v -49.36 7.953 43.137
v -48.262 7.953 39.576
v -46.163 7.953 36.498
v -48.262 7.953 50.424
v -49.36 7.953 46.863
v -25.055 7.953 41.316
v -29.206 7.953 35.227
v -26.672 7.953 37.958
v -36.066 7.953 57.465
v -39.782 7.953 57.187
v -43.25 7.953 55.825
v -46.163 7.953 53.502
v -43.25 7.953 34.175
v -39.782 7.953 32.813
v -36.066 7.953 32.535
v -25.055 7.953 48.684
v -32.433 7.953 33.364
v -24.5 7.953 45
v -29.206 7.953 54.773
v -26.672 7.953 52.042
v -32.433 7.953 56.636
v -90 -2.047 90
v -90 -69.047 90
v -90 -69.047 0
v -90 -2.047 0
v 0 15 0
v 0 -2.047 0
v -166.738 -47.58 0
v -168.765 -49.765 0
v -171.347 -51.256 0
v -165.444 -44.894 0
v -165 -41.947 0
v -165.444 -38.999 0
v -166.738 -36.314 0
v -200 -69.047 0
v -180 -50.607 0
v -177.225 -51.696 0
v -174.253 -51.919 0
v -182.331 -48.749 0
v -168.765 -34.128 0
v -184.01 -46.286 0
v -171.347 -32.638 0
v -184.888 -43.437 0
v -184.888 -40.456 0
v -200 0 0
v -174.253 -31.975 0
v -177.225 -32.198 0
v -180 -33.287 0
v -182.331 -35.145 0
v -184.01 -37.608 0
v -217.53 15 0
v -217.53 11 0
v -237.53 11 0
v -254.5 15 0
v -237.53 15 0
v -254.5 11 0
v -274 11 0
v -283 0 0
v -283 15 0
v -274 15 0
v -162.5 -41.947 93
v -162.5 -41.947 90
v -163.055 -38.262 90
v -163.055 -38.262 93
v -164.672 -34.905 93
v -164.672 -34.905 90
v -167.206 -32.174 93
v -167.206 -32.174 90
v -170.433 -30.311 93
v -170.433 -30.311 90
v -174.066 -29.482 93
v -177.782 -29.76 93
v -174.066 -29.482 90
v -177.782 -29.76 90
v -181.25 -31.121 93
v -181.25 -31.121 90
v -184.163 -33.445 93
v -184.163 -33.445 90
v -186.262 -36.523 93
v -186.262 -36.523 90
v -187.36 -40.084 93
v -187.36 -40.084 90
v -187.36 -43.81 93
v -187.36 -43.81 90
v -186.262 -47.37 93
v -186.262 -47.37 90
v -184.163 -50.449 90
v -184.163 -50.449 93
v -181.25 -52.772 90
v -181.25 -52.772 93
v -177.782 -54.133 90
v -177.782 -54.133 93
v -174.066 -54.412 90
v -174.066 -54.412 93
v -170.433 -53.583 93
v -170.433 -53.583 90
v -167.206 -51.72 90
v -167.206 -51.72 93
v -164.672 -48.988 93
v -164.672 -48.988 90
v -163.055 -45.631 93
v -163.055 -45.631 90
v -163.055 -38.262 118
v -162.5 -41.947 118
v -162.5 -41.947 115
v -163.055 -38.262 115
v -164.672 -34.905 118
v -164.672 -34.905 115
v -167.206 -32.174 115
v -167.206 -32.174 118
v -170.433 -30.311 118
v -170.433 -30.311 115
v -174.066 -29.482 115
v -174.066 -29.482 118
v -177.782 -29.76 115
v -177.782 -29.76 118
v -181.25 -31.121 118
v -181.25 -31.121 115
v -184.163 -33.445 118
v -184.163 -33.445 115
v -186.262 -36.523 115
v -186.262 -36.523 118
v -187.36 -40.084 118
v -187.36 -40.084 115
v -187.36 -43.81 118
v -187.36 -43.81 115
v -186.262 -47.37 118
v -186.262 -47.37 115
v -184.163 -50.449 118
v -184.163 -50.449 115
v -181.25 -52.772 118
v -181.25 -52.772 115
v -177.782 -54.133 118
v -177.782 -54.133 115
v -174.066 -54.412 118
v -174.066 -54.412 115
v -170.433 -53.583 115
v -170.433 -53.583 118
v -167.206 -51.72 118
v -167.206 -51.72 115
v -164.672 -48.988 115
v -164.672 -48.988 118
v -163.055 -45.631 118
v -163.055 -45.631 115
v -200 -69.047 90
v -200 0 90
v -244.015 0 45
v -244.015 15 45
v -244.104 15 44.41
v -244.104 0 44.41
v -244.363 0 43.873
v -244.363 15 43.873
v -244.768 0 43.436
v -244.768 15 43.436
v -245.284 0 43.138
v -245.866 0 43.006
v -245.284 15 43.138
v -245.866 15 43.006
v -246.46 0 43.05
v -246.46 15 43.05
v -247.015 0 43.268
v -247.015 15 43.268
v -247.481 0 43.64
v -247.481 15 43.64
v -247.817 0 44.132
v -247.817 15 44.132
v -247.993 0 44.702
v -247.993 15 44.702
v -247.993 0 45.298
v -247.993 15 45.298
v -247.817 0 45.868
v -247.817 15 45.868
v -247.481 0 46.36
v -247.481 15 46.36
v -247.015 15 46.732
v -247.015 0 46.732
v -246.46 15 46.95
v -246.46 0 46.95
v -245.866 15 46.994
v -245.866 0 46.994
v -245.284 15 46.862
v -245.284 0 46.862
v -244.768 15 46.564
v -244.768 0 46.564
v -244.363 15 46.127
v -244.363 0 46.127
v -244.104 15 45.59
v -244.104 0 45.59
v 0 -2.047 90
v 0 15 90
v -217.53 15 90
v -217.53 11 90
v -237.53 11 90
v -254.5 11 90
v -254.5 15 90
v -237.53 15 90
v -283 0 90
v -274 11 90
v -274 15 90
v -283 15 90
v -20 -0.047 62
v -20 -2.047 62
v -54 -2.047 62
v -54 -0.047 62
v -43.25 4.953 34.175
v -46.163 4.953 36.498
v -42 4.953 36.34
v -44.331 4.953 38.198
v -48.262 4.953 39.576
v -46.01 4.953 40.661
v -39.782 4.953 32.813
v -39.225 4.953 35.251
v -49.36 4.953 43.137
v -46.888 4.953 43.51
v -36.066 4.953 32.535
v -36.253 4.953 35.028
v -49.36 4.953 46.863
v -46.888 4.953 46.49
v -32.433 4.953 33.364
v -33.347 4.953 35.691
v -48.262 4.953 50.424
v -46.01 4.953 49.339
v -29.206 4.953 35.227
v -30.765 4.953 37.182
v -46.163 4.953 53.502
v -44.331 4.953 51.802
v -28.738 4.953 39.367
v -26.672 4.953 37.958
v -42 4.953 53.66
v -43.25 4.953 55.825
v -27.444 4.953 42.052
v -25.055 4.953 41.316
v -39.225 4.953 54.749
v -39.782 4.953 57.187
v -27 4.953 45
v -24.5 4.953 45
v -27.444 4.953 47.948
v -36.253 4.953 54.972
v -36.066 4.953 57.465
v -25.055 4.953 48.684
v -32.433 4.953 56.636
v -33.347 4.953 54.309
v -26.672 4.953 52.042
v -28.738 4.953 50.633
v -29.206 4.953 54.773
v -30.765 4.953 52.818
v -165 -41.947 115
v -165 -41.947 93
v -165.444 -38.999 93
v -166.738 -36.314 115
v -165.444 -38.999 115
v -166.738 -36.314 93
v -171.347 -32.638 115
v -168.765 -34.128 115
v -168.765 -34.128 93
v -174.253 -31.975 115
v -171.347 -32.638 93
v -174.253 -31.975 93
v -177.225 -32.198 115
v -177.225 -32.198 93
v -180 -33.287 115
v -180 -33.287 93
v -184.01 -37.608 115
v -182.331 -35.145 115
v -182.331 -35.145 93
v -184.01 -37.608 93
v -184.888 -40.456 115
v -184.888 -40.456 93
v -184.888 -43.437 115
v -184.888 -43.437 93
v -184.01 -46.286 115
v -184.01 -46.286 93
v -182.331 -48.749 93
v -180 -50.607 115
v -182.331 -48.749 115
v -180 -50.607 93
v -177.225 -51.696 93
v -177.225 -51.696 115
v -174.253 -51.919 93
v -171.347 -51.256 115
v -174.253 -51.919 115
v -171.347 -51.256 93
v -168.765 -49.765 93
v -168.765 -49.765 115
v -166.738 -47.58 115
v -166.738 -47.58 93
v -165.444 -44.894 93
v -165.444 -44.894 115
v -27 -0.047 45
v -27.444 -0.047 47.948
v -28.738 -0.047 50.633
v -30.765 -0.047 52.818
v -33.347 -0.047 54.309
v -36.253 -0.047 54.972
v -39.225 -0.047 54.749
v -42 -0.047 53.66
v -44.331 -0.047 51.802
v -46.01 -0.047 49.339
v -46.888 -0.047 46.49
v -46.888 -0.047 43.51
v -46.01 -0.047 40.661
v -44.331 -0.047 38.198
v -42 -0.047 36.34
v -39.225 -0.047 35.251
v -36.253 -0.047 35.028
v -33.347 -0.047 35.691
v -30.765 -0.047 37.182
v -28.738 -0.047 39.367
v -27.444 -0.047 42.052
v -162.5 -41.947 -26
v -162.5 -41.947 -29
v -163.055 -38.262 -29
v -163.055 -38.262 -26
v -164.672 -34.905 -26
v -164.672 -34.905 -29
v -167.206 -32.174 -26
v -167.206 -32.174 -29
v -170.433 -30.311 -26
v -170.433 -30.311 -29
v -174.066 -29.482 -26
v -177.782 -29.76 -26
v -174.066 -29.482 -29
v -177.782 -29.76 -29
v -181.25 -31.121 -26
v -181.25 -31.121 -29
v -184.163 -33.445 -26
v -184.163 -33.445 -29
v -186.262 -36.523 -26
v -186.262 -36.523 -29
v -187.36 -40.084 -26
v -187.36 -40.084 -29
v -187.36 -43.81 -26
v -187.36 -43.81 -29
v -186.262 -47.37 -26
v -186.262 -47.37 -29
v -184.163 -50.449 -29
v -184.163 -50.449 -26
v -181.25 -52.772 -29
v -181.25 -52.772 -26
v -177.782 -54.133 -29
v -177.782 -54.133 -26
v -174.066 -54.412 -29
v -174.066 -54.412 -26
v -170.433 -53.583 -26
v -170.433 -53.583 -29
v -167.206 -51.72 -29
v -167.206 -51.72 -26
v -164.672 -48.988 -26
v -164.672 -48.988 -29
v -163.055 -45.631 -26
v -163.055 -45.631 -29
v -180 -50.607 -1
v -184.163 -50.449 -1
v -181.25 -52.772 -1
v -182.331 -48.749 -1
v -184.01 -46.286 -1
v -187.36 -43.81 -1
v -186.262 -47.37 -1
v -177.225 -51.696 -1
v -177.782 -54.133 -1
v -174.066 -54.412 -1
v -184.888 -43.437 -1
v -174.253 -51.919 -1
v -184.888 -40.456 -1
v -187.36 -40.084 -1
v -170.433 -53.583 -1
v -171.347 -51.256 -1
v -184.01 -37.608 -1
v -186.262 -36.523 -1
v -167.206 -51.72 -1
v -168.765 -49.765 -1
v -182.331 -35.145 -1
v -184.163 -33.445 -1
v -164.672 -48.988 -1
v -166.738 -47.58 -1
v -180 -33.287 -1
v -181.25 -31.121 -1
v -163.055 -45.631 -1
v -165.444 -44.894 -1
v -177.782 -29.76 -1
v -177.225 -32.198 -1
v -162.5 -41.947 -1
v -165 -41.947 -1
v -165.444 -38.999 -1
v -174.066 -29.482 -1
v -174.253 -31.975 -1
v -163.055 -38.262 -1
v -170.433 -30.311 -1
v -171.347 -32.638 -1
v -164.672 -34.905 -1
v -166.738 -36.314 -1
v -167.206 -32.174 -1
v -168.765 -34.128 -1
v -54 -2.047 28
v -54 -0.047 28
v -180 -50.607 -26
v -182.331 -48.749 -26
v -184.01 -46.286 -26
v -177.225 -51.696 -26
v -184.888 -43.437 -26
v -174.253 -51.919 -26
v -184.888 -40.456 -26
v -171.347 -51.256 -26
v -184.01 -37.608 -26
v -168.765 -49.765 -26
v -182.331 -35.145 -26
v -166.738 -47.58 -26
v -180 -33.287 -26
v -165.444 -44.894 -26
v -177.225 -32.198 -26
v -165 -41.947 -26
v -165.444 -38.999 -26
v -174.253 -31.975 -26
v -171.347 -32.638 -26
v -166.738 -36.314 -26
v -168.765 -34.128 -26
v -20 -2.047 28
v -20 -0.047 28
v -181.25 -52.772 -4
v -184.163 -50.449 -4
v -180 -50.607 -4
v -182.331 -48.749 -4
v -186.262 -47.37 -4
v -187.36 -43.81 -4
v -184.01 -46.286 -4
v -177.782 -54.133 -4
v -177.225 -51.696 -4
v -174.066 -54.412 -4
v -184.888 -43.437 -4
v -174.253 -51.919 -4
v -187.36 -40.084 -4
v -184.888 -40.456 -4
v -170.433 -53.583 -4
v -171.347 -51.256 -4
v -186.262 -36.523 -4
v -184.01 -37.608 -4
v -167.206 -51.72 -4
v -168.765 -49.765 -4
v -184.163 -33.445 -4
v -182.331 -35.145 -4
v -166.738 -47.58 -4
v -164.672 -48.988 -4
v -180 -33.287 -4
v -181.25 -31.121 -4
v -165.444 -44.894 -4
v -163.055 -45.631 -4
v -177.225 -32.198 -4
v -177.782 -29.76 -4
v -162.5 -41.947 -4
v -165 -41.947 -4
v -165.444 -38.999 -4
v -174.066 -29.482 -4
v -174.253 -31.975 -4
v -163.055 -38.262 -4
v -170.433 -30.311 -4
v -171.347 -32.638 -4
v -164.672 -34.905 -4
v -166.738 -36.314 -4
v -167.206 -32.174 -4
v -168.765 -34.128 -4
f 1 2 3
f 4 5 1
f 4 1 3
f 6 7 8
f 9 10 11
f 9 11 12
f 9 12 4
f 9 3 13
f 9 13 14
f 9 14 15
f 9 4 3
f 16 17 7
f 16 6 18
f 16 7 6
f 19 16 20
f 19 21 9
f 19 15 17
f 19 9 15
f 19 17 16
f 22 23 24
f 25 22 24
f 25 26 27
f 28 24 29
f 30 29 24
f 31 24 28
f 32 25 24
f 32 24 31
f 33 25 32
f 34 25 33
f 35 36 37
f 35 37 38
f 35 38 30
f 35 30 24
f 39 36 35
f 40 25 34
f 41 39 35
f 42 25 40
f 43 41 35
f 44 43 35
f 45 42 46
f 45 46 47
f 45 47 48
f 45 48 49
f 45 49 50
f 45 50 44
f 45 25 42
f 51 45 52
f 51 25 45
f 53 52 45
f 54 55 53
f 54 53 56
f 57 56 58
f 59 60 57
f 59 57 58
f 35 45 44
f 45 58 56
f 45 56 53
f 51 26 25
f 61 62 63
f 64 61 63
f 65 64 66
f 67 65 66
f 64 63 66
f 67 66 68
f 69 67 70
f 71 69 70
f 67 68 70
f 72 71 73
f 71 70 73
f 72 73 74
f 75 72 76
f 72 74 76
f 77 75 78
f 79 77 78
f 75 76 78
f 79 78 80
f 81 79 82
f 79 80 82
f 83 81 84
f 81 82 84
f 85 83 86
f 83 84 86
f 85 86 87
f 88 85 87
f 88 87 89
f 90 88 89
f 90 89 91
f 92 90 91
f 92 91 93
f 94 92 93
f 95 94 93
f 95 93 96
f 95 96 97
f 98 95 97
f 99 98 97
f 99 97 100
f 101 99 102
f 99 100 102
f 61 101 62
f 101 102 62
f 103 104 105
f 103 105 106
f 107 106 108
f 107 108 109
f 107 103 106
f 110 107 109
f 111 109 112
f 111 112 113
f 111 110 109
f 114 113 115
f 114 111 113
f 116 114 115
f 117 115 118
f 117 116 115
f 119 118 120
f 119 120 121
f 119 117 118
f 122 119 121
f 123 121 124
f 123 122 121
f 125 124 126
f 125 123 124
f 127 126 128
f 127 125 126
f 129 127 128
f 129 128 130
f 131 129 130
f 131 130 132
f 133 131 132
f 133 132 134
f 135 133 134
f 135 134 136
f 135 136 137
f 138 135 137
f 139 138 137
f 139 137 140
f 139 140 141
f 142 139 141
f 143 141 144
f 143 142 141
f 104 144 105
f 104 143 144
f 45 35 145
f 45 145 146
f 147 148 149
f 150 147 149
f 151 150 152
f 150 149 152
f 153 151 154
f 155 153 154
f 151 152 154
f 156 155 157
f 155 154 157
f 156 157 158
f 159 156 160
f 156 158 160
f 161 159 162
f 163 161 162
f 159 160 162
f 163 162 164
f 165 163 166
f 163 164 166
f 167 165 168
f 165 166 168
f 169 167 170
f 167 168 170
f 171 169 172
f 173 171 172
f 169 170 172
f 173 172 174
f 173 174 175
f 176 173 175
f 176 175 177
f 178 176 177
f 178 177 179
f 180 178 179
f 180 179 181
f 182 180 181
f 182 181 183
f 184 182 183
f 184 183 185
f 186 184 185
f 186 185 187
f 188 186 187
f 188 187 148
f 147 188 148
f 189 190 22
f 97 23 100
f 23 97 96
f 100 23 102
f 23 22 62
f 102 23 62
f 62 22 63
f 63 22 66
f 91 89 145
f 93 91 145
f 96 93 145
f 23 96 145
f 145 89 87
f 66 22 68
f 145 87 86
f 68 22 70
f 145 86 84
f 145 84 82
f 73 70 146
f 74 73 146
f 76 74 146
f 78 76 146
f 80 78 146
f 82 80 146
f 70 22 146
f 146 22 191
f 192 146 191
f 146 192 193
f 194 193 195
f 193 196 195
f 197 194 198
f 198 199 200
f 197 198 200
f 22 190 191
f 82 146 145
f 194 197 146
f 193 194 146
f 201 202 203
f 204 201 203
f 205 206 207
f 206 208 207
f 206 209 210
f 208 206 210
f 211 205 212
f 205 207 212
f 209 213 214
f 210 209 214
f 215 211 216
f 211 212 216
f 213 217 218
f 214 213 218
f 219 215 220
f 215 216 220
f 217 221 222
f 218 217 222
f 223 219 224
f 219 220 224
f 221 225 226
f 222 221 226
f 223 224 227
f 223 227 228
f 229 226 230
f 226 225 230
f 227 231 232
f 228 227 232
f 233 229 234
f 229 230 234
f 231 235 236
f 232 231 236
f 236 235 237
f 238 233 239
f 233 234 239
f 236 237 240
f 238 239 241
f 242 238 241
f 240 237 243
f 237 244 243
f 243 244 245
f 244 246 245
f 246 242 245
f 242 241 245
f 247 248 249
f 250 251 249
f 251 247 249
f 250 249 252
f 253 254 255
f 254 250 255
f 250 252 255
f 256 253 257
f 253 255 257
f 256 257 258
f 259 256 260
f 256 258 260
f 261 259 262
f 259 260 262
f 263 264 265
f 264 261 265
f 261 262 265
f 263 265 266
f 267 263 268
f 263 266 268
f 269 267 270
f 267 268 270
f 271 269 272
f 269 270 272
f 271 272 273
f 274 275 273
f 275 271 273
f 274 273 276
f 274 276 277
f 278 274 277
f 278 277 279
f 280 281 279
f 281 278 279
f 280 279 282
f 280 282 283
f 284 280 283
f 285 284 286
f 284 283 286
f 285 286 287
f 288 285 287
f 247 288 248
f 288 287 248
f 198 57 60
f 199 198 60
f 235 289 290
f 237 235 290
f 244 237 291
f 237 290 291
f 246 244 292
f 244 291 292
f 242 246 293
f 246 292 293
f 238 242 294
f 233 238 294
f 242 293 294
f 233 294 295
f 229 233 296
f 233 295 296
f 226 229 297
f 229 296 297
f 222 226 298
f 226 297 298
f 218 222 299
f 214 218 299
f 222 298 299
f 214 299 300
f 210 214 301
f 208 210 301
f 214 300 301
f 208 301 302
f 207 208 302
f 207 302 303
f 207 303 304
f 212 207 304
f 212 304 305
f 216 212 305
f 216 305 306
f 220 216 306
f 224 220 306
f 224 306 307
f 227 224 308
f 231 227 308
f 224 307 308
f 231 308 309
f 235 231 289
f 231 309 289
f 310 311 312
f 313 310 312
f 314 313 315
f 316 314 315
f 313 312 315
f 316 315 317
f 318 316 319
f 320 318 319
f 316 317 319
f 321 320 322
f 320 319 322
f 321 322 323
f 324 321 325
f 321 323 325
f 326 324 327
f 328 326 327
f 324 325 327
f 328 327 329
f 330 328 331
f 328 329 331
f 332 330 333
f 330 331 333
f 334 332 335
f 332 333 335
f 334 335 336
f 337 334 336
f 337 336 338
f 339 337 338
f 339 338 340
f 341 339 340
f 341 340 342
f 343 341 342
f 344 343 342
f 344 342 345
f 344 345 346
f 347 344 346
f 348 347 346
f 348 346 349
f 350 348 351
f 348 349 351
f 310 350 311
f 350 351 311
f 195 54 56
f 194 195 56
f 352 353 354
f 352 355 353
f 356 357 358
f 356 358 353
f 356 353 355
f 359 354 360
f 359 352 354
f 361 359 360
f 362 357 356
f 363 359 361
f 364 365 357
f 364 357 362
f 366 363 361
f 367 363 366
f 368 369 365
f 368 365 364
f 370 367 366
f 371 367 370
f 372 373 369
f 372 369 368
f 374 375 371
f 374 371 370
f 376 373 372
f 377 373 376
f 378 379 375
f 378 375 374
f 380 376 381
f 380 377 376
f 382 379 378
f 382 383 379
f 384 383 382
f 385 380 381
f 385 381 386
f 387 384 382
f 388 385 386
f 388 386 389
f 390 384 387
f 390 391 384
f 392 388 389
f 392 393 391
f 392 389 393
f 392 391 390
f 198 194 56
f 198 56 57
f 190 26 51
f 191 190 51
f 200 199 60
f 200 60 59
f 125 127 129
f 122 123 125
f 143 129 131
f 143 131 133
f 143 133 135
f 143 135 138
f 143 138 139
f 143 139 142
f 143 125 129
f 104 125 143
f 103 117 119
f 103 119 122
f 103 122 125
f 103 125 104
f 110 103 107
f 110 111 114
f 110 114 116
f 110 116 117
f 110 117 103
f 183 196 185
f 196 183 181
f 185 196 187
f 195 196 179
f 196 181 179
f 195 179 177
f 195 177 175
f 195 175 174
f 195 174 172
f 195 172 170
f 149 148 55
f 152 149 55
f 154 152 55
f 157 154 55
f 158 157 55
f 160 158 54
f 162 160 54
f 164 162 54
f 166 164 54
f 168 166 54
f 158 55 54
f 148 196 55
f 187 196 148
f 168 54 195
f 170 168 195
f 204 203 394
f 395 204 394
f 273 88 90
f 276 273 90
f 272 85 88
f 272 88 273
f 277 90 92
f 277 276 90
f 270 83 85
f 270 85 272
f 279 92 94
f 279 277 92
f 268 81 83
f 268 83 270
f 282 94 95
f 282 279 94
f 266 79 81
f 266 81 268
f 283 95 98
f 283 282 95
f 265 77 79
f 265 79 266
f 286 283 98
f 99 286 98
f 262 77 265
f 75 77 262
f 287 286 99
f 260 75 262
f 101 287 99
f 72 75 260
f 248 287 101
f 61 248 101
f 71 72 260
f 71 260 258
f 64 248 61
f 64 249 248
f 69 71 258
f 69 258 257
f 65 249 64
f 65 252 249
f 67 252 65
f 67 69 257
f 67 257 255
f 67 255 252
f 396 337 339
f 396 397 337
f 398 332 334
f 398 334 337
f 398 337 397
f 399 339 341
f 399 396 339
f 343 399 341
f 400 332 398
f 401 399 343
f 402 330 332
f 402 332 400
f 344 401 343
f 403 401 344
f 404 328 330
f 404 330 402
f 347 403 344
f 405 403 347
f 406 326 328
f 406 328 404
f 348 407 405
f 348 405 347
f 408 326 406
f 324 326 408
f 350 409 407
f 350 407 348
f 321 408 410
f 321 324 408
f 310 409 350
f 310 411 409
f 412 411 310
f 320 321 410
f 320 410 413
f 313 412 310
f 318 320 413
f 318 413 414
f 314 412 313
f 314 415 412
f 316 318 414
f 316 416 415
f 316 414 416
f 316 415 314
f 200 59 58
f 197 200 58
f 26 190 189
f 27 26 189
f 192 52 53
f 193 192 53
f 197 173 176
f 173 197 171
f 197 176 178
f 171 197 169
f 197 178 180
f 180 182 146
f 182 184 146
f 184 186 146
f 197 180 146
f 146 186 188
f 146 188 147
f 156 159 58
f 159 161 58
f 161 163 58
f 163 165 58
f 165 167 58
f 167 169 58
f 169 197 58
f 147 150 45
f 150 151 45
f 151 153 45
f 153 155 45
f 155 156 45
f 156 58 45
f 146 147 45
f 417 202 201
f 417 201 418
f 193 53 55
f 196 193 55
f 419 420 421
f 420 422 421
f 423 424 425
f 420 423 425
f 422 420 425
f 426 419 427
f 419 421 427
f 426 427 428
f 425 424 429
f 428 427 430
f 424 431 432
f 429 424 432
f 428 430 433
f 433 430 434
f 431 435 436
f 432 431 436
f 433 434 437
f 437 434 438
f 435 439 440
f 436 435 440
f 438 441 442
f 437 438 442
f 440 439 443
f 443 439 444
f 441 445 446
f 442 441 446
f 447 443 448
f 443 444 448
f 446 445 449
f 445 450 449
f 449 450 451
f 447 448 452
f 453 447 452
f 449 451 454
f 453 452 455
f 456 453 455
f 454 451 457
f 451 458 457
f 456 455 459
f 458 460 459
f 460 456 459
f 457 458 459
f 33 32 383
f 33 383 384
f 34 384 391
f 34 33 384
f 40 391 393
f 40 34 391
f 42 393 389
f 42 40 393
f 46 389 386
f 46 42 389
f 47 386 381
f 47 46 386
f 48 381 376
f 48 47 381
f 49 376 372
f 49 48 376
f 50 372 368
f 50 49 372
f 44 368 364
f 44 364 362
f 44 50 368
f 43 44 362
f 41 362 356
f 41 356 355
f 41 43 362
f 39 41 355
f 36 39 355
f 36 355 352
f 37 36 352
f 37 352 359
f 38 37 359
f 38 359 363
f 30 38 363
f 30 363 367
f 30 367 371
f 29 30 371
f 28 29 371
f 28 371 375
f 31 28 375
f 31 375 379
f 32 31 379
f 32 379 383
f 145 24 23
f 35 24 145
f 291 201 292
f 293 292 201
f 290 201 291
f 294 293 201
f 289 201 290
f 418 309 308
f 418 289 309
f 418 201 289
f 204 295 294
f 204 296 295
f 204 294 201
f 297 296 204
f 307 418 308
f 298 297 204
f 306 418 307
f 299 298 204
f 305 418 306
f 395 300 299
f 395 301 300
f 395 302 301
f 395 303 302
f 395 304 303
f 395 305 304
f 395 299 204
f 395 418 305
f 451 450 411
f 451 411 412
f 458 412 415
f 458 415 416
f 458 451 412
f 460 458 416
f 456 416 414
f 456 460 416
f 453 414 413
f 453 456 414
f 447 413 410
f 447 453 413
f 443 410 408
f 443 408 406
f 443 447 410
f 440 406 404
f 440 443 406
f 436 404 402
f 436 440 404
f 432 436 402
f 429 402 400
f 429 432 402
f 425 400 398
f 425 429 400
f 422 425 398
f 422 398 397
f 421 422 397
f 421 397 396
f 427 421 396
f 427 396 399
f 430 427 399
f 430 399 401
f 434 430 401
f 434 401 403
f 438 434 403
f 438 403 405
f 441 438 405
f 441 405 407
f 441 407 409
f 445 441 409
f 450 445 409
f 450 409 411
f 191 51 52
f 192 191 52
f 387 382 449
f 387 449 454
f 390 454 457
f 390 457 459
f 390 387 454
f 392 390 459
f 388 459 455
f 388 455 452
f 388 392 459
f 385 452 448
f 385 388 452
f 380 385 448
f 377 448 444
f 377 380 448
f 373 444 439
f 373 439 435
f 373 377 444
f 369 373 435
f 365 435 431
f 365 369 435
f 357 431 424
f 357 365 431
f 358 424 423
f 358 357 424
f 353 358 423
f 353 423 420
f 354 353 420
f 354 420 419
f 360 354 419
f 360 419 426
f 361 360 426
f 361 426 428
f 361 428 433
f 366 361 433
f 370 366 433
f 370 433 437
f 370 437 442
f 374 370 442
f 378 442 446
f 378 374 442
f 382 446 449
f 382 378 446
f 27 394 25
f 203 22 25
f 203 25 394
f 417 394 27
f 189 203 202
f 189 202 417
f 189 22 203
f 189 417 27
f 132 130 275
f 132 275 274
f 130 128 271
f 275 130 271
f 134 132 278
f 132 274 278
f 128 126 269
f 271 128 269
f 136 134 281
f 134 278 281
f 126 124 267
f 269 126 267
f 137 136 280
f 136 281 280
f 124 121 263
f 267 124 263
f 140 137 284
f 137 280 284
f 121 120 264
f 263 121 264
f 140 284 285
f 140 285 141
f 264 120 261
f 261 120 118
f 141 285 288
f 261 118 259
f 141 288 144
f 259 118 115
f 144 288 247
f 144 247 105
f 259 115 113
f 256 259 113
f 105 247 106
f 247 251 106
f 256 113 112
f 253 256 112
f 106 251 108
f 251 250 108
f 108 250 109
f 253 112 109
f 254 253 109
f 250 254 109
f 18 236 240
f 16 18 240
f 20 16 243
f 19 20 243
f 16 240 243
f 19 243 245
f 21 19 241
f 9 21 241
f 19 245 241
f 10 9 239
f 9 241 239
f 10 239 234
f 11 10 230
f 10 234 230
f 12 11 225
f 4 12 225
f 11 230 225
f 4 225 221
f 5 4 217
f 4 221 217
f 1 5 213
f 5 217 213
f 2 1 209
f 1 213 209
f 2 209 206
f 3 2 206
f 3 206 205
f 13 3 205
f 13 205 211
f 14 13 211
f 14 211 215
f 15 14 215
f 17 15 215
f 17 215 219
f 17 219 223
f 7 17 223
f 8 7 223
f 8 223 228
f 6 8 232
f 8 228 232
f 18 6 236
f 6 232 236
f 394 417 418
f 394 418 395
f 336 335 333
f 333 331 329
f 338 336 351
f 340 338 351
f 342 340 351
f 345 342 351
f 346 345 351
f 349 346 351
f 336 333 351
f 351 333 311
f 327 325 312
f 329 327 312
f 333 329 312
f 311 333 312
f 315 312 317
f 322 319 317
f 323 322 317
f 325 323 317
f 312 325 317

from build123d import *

# Parameters (mm, degrees)
BOSS_EXTRUDE1_DEPTH = 90
SKETCH2_R           = 2
CUT_EXTRUDE1_DEPTH  = 26
BOSS_EXTRUDE2_DEPTH = 90
SKETCH4_W           = 47.922407602
SKETCH4_H           = 26.699627092
BOSS_EXTRUDE3_DEPTH = 20
SKETCH7_R           = 2.5
CUT_EXTRUDE2_DEPTH  = 66.5
SKETCH9_W           = 15
SKETCH9_H           = 8
CUT_EXTRUDE3_DEPTH  = 91
CUT_EXTRUDE4_REACH  = 62.6
SKETCH8_R           = 2.5
CUT_EXTRUDE5_DEPTH  = 67
SKETCH12_W          = 63.84660413
SKETCH12_H          = 90
BOSS_EXTRUDE4_DEPTH = 67
BOSS_EXTRUDE5_START = -3
SKETCH13_R          = 10
BOSS_EXTRUDE5_DEPTH = 31
SKETCH15_R          = 12.5
BOSS_EXTRUDE6_DEPTH = 3
SKETCH16_R          = 12.5
BOSS_EXTRUDE7_DEPTH = 3
SKETCH17_W          = 34
SKETCH17_H          = 34
CUT_EXTRUDE6_DEPTH  = 2
SKETCH18_R          = 10
CUT_EXTRUDE7_DEPTH  = 5
SKETCH19_R          = 12.5
CUT_EXTRUDE8_DEPTH  = 3


with BuildPart() as part:
    # Sketch1 → Boss-Extrude1 (new body)
    with BuildSketch(Plane.XY):
        Polygon((-283, 0), (0, 0), (0, 15), (-217.53, 15), (-217.53, 11), (-237.53, 11), (-237.53, 15), (-254.5, 15), (-254.5, 11), (-274, 11), (-274, 15), (-283, 15), align=None)
    extrude(amount=BOSS_EXTRUDE1_DEPTH)

    # Sketch2 → Cut-Extrude1 (cut)
    with BuildSketch(Plane(origin=(0, 15, 0), x_dir=(1, 0, 0), z_dir=(0, 1, 0))):
        with Locations((-246.015, -45)):
            Circle(SKETCH2_R)
    extrude(amount=-CUT_EXTRUDE1_DEPTH, mode=Mode.SUBTRACT)

    # Sketch3 → Boss-Extrude2 (add)
    with BuildSketch(Plane(origin=(0, 0, 0), x_dir=(-1, 0, 0), z_dir=(0, 0, -1))):
        Polygon((0, 0), (0, -61.6), (0, -69.046795722), (8.076697935, -69.046795722), (16.610633667, -45.6), (63.389366333, -45.6), (71.923302065, -69.046795722), (128.076697935, -69.046795722), (136.610633667, -45.6), (183.389366333, -45.6), (191.923302065, -69.046795722), (200, -69.046795722), (200, -61.6), (200, 7.5), (0, 7.5), align=None)
    extrude(amount=-BOSS_EXTRUDE2_DEPTH)

    # Sketch4 → Boss-Extrude3 (add, symmetric)
    with BuildSketch(Plane(origin=(0, 0, 44.5), x_dir=(-1, 0, 0), z_dir=(0, 0, -1))):
        with Locations((40.197751444, -51.696982176)):
            Rectangle(SKETCH4_W, SKETCH4_H)
    extrude(amount=BOSS_EXTRUDE3_DEPTH, both=True)

    # Sketch7 → Cut-Extrude2 (cut, through all)
    with BuildSketch(Plane(origin=(0, 0, 24.5), x_dir=(-1, 0, 0), z_dir=(0, 0, -1))):
        with Locations((40, -61.6)):
            Circle(SKETCH7_R)
    extrude(amount=-CUT_EXTRUDE2_DEPTH, mode=Mode.SUBTRACT)

    # Sketch9 → Cut-Extrude3 (cut, through all)
    with BuildSketch(Plane(origin=(0, 0, 0), x_dir=(-1, 0, 0), z_dir=(0, 0, -1))):
        with Locations((160, -36.6)):
            Rectangle(SKETCH9_W, SKETCH9_H)
    extrude(amount=-CUT_EXTRUDE3_DEPTH, mode=Mode.SUBTRACT)

    # Sketch8 → Cut-Extrude4 (cut, up to next)
    with BuildSketch(Plane.XZ.offset(45.6), mode=Mode.PRIVATE) as cut_extrude4_sk1:
        with Locations((-160, 75)):
            Circle(SKETCH8_R)
    cut_extrude4_tool1 = extrude(cut_extrude4_sk1.sketch, amount=-CUT_EXTRUDE4_REACH, mode=Mode.PRIVATE) & part.part
    add(cut_extrude4_tool1.solids().sort_by_distance((-160, -45.6, 75))[0], mode=Mode.SUBTRACT)
    # Sketch8 → Cut-Extrude4 (cut, up to next)
    with BuildSketch(Plane.XZ.offset(45.6), mode=Mode.PRIVATE) as cut_extrude4_sk2:
        with Locations((-160, 15)):
            Circle(SKETCH8_R)
    cut_extrude4_tool2 = extrude(cut_extrude4_sk2.sketch, amount=-CUT_EXTRUDE4_REACH, mode=Mode.PRIVATE) & part.part
    add(cut_extrude4_tool2.solids().sort_by_distance((-160, -45.6, 15))[0], mode=Mode.SUBTRACT)

    # Sketch10 → Cut-Extrude5 (cut)
    with BuildSketch(Plane.XZ.offset(69.046795722)):
        Polygon((-8.076697935, 90), (-90, 90), (-90, 0), (-8.076697935, 0), (0, 0), (0, 90), align=None)
    extrude(amount=-CUT_EXTRUDE5_DEPTH, mode=Mode.SUBTRACT)

    # Sketch12 → Boss-Extrude4 (add)
    with BuildSketch(Plane.XZ.offset(69.046795722)):
        with Locations((-160, 45)):
            Rectangle(SKETCH12_W, SKETCH12_H)
    extrude(amount=-BOSS_EXTRUDE4_DEPTH)

    # Sketch13 → Boss-Extrude5 (add)
    with BuildSketch(Plane.XY.offset(90).offset(BOSS_EXTRUDE5_START)):
        with Locations((-175, -41.946795722)):
            Circle(SKETCH13_R)
    boss_extrude5 = extrude(amount=BOSS_EXTRUDE5_DEPTH)

    # Sketch15 → Boss-Extrude6 (add)
    with BuildSketch(Plane.XY.offset(118)):
        with Locations((-175, -41.946795722)):
            Circle(SKETCH15_R)
    boss_extrude6 = extrude(amount=-BOSS_EXTRUDE6_DEPTH)

    # Mirror1: Boss-Extrude5, Boss-Extrude6 across plane
    add(boss_extrude5.mirror(Plane(origin=(0, 0, 44.5), x_dir=(1, 0, 0), z_dir=(0, 0, -1))))
    add(boss_extrude6.mirror(Plane(origin=(0, 0, 44.5), x_dir=(1, 0, 0), z_dir=(0, 0, -1))))

    # Sketch16 → Boss-Extrude7 (add)
    with BuildSketch(Plane.XY.offset(90)):
        with Locations((-175, -41.946795722)):
            Circle(SKETCH16_R)
    boss_extrude7 = extrude(amount=BOSS_EXTRUDE7_DEPTH)

    # Mirror2: Boss-Extrude7 across plane
    add(boss_extrude7.mirror(Plane(origin=(0, 0, 44.5), x_dir=(1, 0, 0), z_dir=(0, 0, -1))))

    # Sketch17 → Cut-Extrude6 (cut)
    with BuildSketch(Plane(origin=(0, -2.046795722, 0), x_dir=(-1, 0, 0), z_dir=(0, -1, 0))):
        with Locations((37, -45)):
            Rectangle(SKETCH17_W, SKETCH17_H)
    extrude(amount=-CUT_EXTRUDE6_DEPTH, mode=Mode.SUBTRACT)

    # Sketch18 → Cut-Extrude7 (cut)
    with BuildSketch(Plane.XZ.offset(0.046795722)):
        with Locations((-37, 45)):
            Circle(SKETCH18_R)
    extrude(amount=-CUT_EXTRUDE7_DEPTH, mode=Mode.SUBTRACT)

    # Sketch19 → Cut-Extrude8 (cut)
    with BuildSketch(Plane.XZ.offset(-4.953204278)):
        with Locations((-37, 45)):
            Circle(SKETCH19_R)
    extrude(amount=-CUT_EXTRUDE8_DEPTH, mode=Mode.SUBTRACT)


solid = part.part
